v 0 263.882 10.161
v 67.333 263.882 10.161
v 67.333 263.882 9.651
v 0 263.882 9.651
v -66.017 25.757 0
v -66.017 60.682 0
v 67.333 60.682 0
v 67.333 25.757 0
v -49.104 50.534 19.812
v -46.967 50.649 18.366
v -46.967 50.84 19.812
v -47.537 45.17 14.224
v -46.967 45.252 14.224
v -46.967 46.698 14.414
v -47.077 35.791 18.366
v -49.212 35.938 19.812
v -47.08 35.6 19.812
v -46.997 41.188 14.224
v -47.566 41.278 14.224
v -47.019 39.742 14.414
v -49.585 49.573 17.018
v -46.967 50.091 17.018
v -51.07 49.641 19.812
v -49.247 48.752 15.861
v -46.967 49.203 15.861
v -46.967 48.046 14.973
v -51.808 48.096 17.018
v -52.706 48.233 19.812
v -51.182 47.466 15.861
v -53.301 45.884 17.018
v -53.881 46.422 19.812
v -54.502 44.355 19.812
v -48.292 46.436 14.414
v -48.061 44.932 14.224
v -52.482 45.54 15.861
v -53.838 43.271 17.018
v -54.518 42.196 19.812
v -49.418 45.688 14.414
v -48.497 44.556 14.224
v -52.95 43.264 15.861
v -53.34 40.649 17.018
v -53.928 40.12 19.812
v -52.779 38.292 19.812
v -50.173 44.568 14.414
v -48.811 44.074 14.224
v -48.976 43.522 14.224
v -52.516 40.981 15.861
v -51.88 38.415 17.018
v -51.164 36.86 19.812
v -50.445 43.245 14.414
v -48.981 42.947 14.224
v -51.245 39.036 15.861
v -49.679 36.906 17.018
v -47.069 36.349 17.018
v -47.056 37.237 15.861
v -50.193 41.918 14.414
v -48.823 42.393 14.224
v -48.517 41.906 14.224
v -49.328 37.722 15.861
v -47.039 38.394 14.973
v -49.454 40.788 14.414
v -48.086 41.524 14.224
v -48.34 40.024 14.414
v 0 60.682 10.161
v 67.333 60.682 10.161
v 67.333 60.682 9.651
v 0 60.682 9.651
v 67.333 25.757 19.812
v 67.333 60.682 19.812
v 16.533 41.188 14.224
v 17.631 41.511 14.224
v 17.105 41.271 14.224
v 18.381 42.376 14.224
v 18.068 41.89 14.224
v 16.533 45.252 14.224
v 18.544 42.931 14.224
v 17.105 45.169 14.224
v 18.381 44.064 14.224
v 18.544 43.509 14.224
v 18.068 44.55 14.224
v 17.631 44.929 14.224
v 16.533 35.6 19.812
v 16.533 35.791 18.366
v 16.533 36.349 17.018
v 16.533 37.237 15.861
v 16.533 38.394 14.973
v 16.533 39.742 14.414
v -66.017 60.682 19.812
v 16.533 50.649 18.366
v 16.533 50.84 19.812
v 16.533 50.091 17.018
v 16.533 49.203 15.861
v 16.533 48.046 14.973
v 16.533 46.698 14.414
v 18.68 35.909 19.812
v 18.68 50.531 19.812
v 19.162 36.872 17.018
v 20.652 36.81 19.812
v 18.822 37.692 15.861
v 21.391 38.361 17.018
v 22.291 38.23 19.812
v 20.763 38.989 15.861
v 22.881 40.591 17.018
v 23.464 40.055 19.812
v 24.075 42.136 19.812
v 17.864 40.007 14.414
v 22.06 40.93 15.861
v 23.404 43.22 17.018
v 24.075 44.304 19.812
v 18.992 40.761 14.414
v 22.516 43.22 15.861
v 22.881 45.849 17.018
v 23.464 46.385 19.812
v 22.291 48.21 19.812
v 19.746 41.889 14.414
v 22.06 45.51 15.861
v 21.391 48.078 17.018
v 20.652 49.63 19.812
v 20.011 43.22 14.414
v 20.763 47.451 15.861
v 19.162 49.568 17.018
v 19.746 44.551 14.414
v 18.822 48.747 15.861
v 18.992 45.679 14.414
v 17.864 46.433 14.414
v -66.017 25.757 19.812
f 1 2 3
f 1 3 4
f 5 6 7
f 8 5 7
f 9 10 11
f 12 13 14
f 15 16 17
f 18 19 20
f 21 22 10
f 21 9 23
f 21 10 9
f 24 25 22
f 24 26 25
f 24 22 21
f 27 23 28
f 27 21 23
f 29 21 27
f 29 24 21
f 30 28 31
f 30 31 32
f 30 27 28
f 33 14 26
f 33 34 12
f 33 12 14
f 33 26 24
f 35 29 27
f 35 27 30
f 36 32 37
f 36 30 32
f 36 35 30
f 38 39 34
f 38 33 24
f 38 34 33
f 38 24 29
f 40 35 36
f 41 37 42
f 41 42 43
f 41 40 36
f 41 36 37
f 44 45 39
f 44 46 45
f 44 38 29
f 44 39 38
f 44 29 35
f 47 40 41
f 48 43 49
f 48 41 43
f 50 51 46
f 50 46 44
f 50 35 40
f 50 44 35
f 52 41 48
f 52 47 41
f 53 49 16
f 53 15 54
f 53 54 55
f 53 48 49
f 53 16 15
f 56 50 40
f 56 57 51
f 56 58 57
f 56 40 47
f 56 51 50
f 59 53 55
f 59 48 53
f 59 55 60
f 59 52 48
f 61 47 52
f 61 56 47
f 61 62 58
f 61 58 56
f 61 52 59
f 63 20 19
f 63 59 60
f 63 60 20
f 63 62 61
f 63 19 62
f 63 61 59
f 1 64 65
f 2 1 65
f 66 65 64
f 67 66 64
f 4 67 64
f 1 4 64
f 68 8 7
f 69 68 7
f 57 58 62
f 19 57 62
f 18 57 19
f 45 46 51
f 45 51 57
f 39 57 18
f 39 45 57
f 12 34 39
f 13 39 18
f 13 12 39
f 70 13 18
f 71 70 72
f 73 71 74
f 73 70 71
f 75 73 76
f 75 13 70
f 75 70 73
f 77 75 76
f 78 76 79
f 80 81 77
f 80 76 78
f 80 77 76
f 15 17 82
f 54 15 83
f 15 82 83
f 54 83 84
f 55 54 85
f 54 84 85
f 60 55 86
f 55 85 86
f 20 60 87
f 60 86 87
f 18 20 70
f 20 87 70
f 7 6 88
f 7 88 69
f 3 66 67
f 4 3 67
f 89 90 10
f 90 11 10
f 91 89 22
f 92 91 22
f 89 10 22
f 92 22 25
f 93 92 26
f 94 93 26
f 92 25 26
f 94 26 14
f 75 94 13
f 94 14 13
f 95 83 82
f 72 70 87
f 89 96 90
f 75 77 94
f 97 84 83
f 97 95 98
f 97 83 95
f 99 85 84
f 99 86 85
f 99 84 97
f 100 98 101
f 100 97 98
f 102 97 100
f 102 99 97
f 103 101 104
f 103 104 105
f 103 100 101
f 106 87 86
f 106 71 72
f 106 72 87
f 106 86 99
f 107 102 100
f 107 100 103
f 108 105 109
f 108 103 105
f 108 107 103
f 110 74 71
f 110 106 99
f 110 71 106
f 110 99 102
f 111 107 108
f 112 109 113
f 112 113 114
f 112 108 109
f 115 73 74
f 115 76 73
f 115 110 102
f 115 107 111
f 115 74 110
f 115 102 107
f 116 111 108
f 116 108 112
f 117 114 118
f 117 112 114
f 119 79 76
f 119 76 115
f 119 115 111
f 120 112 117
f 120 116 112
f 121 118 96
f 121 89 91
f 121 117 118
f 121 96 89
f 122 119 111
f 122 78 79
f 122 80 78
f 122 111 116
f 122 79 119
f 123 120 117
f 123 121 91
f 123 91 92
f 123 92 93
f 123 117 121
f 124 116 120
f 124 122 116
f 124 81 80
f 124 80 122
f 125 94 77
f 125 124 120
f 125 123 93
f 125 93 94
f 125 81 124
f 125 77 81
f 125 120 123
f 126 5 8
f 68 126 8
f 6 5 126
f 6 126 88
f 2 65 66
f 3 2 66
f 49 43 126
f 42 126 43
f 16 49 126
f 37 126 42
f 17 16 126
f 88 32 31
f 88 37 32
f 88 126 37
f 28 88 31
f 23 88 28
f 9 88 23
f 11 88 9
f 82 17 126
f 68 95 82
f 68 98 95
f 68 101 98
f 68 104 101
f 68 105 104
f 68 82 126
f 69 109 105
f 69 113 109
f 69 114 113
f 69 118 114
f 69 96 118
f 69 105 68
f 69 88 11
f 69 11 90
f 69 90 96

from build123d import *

# Parameters (mm, degrees)
F0_W     = 133.35
F0_H     = 34.925
F1_DEPTH = 19.812
F3_DEPTH = 5.588
F5_DEPTH = 203.2
F6_R     = 5.58799


# Not quite as in the source:
# - a fillet or chamfer is up to 0.001 mm smaller than in the source, because OpenCascade refuses the exact size


with BuildPart() as f1:
    # F0 (on Top) → F1 (new body)
    with BuildSketch(Plane.XY):
        with Locations((0.6578612807, 43.2195533067)):
            Rectangle(F0_W, F0_H)
    extrude(amount=F1_DEPTH)

    # F2 (on face) → F3 (cut)
    with BuildSketch(Plane.XY.offset(19.812)):
        with BuildLine():
            ThreePointArc((16.5328612807, 35.600391914), (24.1524419771, 43.2199726103), (16.5328612807, 50.8395533067))
            Line((16.5328612807, 50.8395533067), (-46.9671387193, 50.8395533067))
            ThreePointArc((-46.9671387193, 50.8395533067), (-54.5869290646, 43.276078466), (-47.0801859275, 35.600391914))
            Line((-47.0801859275, 35.600391914), (16.5328612807, 35.600391914))
        make_face()
    extrude(amount=-F3_DEPTH, mode=Mode.SUBTRACT)

    # F6 (radius 5.588 in the source; OpenCascade refuses exactly that, so slightly less here)
    f6_edges = [f1.edges().sort_by_distance(p)[0] for p in [
        (24.152442, 43.219973, 14.224),
        (-15.217139, 50.839553, 14.224),
        (-54.586929, 43.276078, 14.224),
        (-15.273662, 35.600392, 14.224),
    ]]
    fillet(f6_edges, radius=F6_R)


with BuildPart() as f5:
    # F4 (on face) → F5 (new body)
    with BuildSketch(Plane(origin=(0, 60.6820533067, 0), x_dir=(-1, 0, 0), z_dir=(0, 1, 0))):
        Polygon((0, 9.6509261072), (0, 9.906), (0, 10.1556647569), (0, 10.1610738928), (-67.3328612807, 10.1610738928), (-67.3328612807, 9.6509261072), align=None)
    extrude(amount=F5_DEPTH)


solid = Compound([f1.part, f5.part])
